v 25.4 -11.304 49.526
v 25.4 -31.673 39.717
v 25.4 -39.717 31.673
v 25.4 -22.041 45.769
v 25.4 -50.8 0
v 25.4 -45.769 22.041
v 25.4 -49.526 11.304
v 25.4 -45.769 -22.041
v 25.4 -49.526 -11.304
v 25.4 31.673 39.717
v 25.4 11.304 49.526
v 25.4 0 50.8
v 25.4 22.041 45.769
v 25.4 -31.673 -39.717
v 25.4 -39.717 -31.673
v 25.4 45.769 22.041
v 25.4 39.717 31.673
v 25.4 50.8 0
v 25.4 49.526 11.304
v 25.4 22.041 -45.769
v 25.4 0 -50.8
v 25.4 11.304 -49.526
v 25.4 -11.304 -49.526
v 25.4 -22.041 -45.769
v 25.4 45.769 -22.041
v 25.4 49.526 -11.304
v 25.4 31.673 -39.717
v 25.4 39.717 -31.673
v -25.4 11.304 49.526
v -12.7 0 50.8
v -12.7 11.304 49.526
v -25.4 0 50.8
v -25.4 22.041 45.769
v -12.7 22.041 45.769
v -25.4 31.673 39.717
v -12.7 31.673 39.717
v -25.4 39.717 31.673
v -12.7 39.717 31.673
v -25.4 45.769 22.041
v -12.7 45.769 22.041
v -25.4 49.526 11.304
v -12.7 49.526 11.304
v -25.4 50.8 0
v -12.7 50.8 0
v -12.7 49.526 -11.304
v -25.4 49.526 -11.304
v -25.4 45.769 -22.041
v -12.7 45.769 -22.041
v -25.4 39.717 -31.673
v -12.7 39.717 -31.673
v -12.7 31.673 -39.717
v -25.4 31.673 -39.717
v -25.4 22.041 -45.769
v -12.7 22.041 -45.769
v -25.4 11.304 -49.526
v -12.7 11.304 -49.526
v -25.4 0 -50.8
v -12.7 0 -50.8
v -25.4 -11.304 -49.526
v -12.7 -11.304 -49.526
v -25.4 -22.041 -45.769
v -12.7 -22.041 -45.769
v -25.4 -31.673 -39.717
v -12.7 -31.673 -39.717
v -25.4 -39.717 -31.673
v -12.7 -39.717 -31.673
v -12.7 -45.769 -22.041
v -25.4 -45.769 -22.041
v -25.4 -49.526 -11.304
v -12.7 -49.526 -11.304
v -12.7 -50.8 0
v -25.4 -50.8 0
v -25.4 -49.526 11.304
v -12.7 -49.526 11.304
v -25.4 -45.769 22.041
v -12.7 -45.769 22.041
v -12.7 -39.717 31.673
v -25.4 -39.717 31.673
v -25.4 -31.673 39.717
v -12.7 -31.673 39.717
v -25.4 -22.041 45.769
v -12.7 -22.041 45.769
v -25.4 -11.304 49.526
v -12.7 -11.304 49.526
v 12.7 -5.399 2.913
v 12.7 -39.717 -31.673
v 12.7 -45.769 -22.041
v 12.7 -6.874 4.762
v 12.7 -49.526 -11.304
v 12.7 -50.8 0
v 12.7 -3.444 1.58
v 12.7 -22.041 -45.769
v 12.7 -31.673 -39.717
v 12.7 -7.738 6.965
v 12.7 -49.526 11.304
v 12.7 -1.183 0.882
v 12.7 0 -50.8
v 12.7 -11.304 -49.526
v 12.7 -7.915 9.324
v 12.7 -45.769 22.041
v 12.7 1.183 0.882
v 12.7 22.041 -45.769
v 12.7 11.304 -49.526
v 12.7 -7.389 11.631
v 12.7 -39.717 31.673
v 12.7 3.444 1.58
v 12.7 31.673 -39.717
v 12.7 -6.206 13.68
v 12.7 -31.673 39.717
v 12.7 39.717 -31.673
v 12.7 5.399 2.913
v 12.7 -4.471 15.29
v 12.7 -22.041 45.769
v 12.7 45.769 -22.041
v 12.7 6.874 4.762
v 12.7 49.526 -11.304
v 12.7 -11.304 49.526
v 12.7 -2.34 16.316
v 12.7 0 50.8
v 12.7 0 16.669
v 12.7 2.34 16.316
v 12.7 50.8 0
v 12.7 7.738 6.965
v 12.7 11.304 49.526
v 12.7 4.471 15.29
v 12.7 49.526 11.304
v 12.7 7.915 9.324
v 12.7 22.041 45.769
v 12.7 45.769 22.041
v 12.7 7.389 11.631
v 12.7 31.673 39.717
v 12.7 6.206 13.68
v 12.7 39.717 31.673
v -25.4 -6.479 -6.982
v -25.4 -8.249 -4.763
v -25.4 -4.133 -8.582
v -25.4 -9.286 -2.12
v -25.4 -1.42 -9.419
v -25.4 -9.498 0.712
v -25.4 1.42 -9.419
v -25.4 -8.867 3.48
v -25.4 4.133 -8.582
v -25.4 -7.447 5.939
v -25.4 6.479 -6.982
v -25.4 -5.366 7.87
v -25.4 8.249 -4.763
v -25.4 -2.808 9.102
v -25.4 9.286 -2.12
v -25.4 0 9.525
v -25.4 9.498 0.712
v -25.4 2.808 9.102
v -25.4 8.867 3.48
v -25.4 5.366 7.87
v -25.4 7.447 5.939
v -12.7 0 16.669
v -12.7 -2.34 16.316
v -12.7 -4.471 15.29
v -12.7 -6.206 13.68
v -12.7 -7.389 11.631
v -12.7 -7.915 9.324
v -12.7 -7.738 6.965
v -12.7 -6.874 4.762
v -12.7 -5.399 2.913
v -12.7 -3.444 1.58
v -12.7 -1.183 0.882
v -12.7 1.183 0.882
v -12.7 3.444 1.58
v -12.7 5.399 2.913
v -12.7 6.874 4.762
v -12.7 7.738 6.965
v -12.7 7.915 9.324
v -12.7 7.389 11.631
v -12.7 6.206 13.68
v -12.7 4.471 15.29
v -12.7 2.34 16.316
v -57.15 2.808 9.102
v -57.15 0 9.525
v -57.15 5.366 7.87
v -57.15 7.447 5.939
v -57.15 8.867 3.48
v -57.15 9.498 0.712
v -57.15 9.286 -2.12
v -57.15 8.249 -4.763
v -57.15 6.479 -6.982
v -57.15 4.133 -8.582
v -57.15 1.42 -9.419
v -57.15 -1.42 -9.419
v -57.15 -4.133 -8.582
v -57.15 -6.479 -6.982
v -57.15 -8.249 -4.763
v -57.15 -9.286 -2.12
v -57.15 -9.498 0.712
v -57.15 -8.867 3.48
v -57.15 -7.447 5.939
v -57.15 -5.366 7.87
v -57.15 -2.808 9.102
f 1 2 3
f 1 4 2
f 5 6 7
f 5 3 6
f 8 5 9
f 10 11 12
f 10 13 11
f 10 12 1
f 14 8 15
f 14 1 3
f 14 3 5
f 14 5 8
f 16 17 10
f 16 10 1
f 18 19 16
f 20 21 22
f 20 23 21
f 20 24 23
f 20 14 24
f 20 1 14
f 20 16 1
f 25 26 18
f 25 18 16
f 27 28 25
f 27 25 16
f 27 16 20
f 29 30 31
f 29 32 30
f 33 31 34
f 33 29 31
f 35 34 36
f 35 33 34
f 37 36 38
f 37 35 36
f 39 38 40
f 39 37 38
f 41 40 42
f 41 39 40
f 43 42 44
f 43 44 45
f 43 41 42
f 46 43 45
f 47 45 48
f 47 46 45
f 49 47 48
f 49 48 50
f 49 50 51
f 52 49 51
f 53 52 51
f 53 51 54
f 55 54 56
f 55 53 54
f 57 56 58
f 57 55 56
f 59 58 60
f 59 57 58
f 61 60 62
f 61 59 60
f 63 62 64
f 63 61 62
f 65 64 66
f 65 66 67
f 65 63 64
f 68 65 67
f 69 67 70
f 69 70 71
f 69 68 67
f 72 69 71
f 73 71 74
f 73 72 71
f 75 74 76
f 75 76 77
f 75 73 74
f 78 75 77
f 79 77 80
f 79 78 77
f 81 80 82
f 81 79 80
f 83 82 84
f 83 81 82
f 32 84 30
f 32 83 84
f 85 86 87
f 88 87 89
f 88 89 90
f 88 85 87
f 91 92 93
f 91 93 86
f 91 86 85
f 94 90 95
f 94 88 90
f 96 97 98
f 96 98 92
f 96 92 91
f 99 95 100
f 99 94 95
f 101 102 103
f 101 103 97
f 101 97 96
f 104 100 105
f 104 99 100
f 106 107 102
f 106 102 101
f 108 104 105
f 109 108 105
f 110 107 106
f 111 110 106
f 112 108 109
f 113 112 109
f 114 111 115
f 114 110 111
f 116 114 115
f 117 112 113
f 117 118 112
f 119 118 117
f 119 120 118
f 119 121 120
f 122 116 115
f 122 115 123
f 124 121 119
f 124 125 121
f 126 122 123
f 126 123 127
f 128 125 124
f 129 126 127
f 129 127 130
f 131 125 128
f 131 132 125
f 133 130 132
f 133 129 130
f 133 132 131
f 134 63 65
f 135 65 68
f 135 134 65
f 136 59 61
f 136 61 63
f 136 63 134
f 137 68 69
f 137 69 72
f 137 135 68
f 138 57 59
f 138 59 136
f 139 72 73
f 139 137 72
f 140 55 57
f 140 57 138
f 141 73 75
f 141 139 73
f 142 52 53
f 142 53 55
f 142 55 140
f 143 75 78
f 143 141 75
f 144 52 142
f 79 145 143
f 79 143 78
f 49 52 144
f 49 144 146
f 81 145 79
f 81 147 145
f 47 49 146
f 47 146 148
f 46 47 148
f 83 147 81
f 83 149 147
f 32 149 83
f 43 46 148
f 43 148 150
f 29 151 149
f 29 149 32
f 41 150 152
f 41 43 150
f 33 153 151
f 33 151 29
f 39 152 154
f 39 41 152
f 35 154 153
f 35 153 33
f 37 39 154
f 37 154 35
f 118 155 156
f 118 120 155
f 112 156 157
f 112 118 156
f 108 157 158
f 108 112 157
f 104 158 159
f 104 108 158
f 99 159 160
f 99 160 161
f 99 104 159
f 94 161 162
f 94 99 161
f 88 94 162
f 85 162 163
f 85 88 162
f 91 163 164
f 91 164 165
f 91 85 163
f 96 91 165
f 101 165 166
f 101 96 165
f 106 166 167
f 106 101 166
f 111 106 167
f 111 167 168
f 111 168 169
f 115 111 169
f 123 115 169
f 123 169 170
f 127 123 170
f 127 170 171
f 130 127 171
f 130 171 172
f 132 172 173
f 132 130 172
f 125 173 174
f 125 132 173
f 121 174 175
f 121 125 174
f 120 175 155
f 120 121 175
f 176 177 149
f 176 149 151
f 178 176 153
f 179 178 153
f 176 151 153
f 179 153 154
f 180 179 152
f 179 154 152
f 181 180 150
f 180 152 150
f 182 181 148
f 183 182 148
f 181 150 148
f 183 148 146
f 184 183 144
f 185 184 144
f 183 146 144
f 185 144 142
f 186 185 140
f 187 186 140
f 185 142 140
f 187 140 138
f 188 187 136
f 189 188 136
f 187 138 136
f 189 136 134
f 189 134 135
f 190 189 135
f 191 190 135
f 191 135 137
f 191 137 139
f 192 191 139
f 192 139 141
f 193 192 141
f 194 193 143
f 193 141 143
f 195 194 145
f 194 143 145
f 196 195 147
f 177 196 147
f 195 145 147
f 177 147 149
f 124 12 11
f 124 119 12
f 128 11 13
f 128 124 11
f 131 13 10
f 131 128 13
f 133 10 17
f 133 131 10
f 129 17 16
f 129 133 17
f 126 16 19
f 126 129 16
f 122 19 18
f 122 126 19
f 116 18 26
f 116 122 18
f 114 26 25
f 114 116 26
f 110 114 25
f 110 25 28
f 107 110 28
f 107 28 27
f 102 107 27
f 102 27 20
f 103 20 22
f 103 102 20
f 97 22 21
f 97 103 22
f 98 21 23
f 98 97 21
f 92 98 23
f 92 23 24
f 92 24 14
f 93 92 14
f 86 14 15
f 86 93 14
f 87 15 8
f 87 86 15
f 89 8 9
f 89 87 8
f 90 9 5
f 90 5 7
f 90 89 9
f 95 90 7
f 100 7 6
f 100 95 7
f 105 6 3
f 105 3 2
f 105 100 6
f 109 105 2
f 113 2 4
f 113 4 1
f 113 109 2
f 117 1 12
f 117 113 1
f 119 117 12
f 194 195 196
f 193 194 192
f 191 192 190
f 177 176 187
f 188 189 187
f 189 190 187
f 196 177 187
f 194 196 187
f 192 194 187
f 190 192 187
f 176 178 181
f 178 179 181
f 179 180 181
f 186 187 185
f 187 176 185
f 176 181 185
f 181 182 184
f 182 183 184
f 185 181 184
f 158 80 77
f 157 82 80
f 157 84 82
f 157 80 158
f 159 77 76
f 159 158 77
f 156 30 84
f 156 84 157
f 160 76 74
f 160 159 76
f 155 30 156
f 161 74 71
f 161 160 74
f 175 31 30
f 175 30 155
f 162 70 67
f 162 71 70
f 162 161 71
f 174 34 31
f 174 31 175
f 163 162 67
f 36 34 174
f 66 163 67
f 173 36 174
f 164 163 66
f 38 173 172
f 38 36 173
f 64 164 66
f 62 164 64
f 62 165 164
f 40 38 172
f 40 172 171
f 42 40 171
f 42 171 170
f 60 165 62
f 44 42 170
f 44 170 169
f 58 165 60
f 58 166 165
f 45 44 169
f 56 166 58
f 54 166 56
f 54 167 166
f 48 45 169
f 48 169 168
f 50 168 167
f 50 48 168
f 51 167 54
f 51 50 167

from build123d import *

# Parameters (mm, degrees)
F0_W = 31.75
F0_H = 9.525
F2_W = 25.4
F2_H = 7.9375


# Not quite as in the source:
# - a feature names something its author has since deleted; it is built from what else it names


with BuildPart() as f1:
    # F0 (on Front) → F1 (revolve)
    with BuildSketch(Plane.XZ):
        with Locations((-41.275, 4.7625)):
            Rectangle(F0_W, F0_H)
        Polygon((-25.4, 9.525), (-25.4, 0), (-12.7, 0), (-12.7, 38.89375), (-12.7, 46.83125), (-12.7, 50.8), (-25.4, 50.8), align=None)
    revolve(axis=Axis((-41.275, 0, 0), (-1, 0, 0)))



with BuildPart() as f1b:
    # F0 (on Front) → F1, piece 2 (revolve)
    with BuildSketch(Plane.XZ):
        Polygon((12.7, 46.83125), (12.7, 38.89375), (12.7, 0), (25.4, 0), (25.4, 9.525), (25.4, 50.8), (12.7, 50.8), align=None)
    revolve(axis=Axis((-41.275, 0, 0), (-1, 0, 0)))


with BuildPart() as f1_1:
    add(f1.part)

    add(f1b.part)  # F3 merges F1b
    # F2 (on Front) → F3 (revolve)
    with BuildSketch(Plane.XZ):
        with Locations((0, 12.7)):
            Rectangle(F2_W, F2_H)
    revolve(axis=Axis((0, 0, 8.73125), (1, 0, 0)))


solid = f1_1.part
